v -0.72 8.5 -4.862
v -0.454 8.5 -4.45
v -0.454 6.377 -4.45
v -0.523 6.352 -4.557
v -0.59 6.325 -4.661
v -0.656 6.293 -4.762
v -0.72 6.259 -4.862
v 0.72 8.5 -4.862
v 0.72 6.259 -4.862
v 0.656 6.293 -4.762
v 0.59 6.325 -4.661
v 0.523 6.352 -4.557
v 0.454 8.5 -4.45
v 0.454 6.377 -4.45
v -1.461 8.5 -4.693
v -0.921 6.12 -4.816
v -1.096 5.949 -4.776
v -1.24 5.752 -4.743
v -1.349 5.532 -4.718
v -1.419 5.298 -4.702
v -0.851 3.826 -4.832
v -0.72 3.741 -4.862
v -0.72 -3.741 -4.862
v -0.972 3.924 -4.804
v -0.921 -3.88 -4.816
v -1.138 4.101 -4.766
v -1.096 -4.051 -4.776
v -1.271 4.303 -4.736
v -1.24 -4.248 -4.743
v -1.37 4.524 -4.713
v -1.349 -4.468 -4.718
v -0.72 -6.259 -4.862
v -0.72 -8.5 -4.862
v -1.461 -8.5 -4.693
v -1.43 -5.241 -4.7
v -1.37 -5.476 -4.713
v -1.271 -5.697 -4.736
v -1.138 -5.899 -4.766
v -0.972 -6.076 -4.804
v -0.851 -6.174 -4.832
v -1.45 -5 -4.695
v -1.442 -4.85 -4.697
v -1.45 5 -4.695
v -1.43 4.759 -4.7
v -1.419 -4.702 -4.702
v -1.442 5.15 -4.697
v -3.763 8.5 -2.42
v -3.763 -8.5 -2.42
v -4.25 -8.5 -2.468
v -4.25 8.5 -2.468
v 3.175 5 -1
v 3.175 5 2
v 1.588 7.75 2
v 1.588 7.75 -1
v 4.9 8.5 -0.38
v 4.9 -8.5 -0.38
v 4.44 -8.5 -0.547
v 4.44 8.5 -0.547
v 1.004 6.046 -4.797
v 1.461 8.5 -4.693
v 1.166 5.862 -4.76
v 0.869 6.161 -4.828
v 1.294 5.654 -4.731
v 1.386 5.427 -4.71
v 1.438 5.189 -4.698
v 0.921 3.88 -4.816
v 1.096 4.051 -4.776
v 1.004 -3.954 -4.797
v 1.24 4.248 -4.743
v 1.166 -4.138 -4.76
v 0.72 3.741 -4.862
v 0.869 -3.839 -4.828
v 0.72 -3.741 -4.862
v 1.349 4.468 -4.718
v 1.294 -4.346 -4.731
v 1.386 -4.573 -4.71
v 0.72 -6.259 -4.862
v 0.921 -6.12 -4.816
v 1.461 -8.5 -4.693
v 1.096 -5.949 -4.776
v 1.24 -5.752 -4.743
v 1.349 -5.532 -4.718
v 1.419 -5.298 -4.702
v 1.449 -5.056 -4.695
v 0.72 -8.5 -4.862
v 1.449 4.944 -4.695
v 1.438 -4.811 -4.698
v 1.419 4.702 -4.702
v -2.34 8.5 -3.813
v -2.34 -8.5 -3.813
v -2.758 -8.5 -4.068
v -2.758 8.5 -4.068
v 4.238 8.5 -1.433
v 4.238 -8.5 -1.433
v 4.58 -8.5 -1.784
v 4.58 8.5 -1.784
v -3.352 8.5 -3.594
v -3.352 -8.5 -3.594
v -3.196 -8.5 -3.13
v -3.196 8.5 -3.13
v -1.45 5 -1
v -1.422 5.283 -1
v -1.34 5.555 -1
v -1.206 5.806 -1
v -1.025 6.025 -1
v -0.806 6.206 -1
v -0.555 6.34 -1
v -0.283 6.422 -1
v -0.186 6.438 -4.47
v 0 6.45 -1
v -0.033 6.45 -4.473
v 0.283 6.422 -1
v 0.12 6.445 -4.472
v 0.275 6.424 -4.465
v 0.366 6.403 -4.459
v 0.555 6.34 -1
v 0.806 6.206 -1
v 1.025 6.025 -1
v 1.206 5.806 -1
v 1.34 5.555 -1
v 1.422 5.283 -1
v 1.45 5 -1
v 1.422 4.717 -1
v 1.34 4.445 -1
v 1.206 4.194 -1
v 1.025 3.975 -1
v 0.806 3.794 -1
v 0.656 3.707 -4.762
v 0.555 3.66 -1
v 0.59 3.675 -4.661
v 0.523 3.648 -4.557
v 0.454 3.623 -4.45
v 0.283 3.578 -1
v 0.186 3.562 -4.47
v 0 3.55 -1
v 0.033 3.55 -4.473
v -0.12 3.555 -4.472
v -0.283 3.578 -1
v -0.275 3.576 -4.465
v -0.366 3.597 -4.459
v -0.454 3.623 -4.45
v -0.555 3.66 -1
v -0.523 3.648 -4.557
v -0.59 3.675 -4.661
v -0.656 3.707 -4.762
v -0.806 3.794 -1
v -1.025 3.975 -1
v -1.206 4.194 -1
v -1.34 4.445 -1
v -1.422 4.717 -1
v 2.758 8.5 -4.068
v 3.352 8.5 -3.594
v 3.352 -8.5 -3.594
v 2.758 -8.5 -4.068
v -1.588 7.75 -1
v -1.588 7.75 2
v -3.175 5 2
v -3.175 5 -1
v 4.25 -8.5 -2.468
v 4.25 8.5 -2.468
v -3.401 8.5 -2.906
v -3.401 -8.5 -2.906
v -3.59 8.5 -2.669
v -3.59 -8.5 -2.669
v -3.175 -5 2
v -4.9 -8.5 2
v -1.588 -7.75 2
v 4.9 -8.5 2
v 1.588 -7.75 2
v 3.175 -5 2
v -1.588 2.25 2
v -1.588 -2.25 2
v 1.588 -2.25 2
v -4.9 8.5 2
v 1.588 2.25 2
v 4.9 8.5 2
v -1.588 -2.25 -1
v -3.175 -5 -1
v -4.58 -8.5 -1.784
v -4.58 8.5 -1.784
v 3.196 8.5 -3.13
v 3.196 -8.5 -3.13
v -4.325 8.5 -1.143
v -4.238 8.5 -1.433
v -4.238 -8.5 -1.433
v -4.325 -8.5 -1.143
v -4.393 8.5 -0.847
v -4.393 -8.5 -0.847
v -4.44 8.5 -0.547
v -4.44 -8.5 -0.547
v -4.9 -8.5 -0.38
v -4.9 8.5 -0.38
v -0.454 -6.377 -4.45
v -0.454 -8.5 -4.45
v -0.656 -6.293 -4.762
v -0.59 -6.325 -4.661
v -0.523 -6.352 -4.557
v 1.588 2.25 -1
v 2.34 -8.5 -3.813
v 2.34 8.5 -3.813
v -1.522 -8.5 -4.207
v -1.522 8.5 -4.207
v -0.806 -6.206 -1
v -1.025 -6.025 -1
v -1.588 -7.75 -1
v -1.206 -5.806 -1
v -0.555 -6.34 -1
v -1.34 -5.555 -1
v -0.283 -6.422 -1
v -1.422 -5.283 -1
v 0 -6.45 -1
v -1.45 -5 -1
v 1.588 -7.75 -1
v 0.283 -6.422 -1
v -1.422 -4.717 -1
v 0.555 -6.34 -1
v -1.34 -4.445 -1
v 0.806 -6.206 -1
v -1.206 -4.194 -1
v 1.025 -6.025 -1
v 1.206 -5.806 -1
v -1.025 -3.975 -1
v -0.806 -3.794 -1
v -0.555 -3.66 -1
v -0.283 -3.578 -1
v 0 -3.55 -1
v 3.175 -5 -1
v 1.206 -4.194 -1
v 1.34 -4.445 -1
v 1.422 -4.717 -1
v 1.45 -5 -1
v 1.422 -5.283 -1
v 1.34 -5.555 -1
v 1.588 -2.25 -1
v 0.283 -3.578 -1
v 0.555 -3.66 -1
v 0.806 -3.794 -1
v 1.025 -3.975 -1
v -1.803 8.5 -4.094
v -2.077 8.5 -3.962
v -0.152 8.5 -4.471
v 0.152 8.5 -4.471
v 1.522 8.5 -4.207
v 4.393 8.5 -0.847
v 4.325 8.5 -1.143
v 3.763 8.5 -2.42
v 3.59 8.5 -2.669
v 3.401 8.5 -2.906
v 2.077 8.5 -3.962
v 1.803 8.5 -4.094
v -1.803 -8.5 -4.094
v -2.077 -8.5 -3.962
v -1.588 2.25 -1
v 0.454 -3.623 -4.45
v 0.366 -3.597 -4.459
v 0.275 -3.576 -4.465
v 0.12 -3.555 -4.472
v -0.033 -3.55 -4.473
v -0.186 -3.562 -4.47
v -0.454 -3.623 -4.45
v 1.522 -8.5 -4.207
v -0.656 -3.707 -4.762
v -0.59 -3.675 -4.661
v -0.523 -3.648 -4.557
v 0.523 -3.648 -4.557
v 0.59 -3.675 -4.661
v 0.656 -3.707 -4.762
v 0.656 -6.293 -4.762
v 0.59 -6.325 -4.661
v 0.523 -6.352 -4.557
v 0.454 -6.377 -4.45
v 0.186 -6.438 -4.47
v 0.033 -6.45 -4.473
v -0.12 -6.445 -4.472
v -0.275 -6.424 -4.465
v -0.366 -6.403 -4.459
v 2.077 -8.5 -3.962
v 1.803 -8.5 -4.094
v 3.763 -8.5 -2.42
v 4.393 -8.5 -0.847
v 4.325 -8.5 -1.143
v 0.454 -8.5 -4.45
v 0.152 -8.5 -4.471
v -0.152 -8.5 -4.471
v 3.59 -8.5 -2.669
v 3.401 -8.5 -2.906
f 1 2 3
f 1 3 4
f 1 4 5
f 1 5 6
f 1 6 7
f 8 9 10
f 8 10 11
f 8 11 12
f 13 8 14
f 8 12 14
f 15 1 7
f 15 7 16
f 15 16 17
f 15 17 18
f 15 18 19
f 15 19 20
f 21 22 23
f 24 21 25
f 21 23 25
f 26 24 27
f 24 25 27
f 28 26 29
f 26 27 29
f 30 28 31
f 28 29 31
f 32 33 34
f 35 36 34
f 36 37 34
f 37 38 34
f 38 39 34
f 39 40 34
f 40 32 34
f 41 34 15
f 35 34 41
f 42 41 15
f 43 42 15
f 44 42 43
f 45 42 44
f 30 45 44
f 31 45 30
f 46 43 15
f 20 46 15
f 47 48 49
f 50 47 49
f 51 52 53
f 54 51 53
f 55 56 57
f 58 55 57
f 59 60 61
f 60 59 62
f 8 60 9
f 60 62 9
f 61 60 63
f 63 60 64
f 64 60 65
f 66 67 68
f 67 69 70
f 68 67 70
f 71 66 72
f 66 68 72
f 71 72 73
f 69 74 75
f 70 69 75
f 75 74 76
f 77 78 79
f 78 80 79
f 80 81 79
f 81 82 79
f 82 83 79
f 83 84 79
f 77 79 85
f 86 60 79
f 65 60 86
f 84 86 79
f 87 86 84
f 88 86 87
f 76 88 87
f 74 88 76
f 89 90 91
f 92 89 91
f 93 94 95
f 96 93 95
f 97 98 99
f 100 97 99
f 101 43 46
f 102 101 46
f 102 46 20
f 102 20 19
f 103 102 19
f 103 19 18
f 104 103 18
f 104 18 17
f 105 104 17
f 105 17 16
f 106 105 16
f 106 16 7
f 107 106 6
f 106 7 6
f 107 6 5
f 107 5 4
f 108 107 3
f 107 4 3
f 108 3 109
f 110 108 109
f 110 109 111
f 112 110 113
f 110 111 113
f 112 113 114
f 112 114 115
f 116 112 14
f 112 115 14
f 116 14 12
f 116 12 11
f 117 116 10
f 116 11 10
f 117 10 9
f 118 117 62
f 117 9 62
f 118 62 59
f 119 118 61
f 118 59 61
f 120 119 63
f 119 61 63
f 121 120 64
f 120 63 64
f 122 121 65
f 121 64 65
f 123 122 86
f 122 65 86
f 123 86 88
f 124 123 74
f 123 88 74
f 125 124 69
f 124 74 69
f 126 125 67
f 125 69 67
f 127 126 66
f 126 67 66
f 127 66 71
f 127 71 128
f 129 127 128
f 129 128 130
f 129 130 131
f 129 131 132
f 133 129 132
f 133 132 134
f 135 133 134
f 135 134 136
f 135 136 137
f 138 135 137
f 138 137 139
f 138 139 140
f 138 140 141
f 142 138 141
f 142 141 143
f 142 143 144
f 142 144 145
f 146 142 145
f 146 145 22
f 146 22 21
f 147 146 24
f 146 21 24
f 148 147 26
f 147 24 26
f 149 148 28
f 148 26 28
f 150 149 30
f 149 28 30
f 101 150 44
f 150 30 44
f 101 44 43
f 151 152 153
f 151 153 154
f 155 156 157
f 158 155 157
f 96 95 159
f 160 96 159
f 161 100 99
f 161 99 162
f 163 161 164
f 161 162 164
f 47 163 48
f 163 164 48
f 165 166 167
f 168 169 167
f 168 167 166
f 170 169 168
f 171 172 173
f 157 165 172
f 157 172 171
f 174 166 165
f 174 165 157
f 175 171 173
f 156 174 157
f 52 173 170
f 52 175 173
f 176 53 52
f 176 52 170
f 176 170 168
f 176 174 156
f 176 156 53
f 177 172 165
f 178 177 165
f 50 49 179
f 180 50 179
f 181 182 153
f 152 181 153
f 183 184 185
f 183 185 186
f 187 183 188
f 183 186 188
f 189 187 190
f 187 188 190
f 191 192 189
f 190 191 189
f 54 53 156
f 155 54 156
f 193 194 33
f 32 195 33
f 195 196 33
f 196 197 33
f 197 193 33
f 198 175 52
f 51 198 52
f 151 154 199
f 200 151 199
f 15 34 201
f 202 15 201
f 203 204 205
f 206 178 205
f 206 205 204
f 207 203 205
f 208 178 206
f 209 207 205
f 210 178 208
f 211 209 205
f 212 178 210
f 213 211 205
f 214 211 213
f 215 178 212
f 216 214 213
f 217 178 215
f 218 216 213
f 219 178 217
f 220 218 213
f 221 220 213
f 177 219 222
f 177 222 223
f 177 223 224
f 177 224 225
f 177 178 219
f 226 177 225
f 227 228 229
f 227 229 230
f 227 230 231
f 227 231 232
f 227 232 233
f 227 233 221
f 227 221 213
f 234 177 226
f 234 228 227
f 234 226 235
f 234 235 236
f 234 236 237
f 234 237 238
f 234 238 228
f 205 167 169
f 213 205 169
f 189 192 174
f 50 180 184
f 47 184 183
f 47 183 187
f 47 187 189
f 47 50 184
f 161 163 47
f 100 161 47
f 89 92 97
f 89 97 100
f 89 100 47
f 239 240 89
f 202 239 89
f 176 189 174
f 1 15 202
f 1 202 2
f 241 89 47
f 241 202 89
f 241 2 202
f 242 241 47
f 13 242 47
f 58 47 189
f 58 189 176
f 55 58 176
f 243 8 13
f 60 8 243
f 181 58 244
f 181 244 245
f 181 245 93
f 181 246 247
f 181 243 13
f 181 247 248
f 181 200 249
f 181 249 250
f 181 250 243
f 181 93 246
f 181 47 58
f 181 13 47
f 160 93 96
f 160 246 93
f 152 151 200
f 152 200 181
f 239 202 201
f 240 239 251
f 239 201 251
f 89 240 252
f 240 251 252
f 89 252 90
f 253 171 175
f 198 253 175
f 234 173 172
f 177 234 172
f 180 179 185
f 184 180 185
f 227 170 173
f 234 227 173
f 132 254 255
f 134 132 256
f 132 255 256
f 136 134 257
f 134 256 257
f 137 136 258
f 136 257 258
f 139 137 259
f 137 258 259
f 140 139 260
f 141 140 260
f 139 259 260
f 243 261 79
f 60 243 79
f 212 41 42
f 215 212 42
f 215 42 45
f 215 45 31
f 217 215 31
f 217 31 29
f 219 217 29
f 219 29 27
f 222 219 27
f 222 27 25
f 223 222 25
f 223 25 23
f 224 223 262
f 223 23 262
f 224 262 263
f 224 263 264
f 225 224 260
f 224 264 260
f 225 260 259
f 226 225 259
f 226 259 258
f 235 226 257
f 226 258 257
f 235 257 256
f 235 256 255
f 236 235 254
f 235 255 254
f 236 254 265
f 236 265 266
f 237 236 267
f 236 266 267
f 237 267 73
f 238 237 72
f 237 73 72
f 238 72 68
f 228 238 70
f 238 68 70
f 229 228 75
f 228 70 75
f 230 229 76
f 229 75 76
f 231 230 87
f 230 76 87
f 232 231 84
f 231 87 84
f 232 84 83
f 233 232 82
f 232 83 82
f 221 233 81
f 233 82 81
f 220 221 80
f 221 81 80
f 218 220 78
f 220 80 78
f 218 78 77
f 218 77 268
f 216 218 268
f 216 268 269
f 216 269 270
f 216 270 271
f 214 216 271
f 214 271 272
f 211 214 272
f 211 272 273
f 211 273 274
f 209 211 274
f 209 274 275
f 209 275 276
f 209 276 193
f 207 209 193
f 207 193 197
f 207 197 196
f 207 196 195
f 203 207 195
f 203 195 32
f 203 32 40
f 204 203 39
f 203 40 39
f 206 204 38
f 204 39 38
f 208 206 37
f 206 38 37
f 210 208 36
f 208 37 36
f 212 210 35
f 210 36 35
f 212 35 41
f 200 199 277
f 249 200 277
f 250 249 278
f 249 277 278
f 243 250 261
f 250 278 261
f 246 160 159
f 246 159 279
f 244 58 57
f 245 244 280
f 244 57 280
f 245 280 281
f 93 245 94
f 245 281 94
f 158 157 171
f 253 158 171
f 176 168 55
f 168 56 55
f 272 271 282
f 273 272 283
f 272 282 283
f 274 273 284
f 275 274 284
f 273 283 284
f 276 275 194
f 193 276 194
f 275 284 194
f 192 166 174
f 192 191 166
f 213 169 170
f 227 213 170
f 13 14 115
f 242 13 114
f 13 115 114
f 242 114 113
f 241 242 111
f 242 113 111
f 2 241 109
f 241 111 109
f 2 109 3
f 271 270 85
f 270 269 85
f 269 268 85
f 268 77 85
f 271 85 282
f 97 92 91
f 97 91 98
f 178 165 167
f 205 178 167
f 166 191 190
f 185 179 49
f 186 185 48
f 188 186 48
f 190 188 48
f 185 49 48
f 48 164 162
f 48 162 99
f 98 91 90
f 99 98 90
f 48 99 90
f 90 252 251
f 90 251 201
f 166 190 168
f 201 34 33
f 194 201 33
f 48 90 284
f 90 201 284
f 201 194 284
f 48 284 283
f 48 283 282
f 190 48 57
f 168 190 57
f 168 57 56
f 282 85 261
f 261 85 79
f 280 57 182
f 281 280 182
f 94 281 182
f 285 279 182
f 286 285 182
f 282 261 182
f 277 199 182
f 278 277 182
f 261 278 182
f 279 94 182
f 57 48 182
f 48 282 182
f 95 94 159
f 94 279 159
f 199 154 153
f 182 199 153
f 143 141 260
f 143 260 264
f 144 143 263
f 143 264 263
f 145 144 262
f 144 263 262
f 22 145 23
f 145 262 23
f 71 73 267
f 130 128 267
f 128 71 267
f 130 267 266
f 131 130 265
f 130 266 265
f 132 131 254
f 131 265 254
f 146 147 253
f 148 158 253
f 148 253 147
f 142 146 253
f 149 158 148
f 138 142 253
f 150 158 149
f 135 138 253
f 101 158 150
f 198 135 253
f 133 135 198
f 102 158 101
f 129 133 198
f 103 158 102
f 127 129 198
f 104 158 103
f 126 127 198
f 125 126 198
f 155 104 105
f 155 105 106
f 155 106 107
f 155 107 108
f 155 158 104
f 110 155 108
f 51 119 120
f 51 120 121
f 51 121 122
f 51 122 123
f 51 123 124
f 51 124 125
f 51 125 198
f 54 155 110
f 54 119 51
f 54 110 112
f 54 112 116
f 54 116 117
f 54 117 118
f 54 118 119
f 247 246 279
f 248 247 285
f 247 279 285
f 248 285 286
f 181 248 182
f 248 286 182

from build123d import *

# Parameters (mm, degrees)
BOSS_EXTRUDE1_DEPTH             = 8.5
BOSS_EXTRUDE2_REACH             = 12.596
BOSS_EXTRUDE2_DIRECTION_2_REACH = 12.596
CIRPATTERN1_START               = -8.5
CIRPATTERN1_DEPTH               = 17
CUT_EXTRUDE1_DEPTH              = 19.347920123
CUT_EXTRUDE1_DEPTH_BACK         = 19.347920123
SKETCH10_W                      = 9.8
SKETCH10_H                      = 17
BOSS_EXTRUDE3_DEPTH             = 2
M2_5_CLEARANCE_HOLE1_D          = 2.9
CUT_EXTRUDE2_DEPTH              = 3


# Read off the part's stored shape, not the designer's step: CirPattern1
with BuildPart() as part:
    # Sketch1 → Boss-Extrude1 (new, symmetric)
    with BuildSketch(Plane(origin=(0, 0, 0), x_dir=(1, 0, 0), z_dir=(0, 1, 0))):
        with BuildLine():
            ThreePointArc((-4.44, 0.547426308), (-4.465207061, 0.274228857), (-4.473619962, 0))
            Line((-4.473619962, 0), (-4.44, 0))
            Line((-4.44, 0), (-4.44, 0.547426308))
        make_face()
        with BuildLine():
            Line((-4.44, 0.547426308), (-4.44, 0))
            Line((-4.44, 0), (4.473619962, 0))
            ThreePointArc((4.473619962, 0), (0.274228857, 4.465207061), (-4.44, 0.547426308))
        make_face()
    extrude(amount=BOSS_EXTRUDE1_DEPTH, both=True)

    # Boss-Extrude2: up to this face of the body (flat: up to its plane)
    boss_extrude2_end = Plane(part.part.faces().sort_by_distance((0, 8.5, -1.898663281))[0])
    # Sketch1<3> → Boss-Extrude2 (add, up to the picked face)
    with BuildSketch(Plane(origin=(0, 0, 0), x_dir=(1, 0, 0), z_dir=(0, 1, 0)), mode=Mode.PRIVATE) as boss_extrude2_sk1:
        Polygon((-4.44, 0.547426308), (-4.44, -0.547426308), (-4.9, -0.38), (-4.9, 0.38), align=None)
    boss_extrude2_tool1 = split(extrude(boss_extrude2_sk1.sketch, amount=BOSS_EXTRUDE2_REACH, mode=Mode.PRIVATE), bisect_by=boss_extrude2_end, keep=Keep.BOTH, mode=Mode.PRIVATE)
    # Sketch1<3> → Boss-Extrude2 (add, up to the picked face)
    with BuildSketch(Plane(origin=(0, 0, 0), x_dir=(1, 0, 0), z_dir=(0, 1, 0)), mode=Mode.PRIVATE) as boss_extrude2_sk2:
        with BuildLine():
            Line((-4.473619962, 0), (4.473619962, 0))
            ThreePointArc((4.473619962, 0), (0, 4.473619962), (-4.473619962, 0))
        make_face()
    boss_extrude2_tool2 = split(extrude(boss_extrude2_sk2.sketch, amount=BOSS_EXTRUDE2_REACH, mode=Mode.PRIVATE), bisect_by=boss_extrude2_end, keep=Keep.BOTH, mode=Mode.PRIVATE)
    add(boss_extrude2_tool1.solids().sort_by(Axis((-4.65616, 0, 0), (0, 1, 0)))[0])
    add(boss_extrude2_tool2.solids().sort_by(Axis((0, 0, -1.898663), (0, 1, 0)))[0])

    # Boss-Extrude2 direction 2: up to this face of the body (flat: up to its plane)
    boss_extrude2_direction_2_end = Plane(part.part.faces().sort_by_distance((0, -8.5, -1.898663281))[0])
    # Sketch1<3> → Boss-Extrude2 direction 2 (add, up to the picked face)
    with BuildSketch(Plane(origin=(0, 0, 0), x_dir=(1, 0, 0), z_dir=(0, 1, 0)), mode=Mode.PRIVATE) as boss_extrude2_direction_2_sk1:
        Polygon((-4.44, 0.547426308), (-4.44, -0.547426308), (-4.9, -0.38), (-4.9, 0.38), align=None)
    boss_extrude2_direction_2_tool1 = split(extrude(boss_extrude2_direction_2_sk1.sketch, amount=-BOSS_EXTRUDE2_DIRECTION_2_REACH, mode=Mode.PRIVATE), bisect_by=boss_extrude2_direction_2_end, keep=Keep.BOTH, mode=Mode.PRIVATE)
    # Sketch1<3> → Boss-Extrude2 direction 2 (add, up to the picked face)
    with BuildSketch(Plane(origin=(0, 0, 0), x_dir=(1, 0, 0), z_dir=(0, 1, 0)), mode=Mode.PRIVATE) as boss_extrude2_direction_2_sk2:
        with BuildLine():
            Line((-4.473619962, 0), (4.473619962, 0))
            ThreePointArc((4.473619962, 0), (0, 4.473619962), (-4.473619962, 0))
        make_face()
    boss_extrude2_direction_2_tool2 = split(extrude(boss_extrude2_direction_2_sk2.sketch, amount=-BOSS_EXTRUDE2_DIRECTION_2_REACH, mode=Mode.PRIVATE), bisect_by=boss_extrude2_direction_2_end, keep=Keep.BOTH, mode=Mode.PRIVATE)
    add(boss_extrude2_direction_2_tool1.solids().sort_by(Axis((-4.65616, 0, 0), (0, -1, 0)))[0])
    add(boss_extrude2_direction_2_tool2.solids().sort_by(Axis((0, 0, -1.898663), (0, -1, 0)))[0])

    # CirPattern1 outline → CirPattern1 (add)
    with BuildSketch(Plane(origin=(0, 0, 0), x_dir=(1, 0, 0), z_dir=(0, 1, 0)).offset(CIRPATTERN1_START)):
        with BuildLine():
            Line((4.9, 0.38), (4.44, 0.547426308))
            ThreePointArc((4.44, 0.547426308), (4.465207061, 0.274228857), (4.473619962, 0))
            ThreePointArc((4.473619962, 0), (4.465207061, -0.274228857), (4.44, -0.547426308))
            Line((4.44, -0.547426308), (4.9, -0.38))
            Line((4.9, -0.38), (4.9, 0.38))
        make_face()
        with BuildLine():
            Line((4.249871632, 2.468398491), (3.762782401, 2.419657862))
            ThreePointArc((3.762782401, 2.419657862), (4.030592313, 1.941030956), (4.237821147, 1.433229741))
            Line((4.237821147, 1.433229741), (4.579623274, 1.783662152))
            Line((4.579623274, 1.783662152), (4.249871632, 2.468398491))
        make_face()
        with BuildLine():
            Line((2.758004066, 4.067900389), (2.340299599, 3.812646502))
            ThreePointArc((2.340299599, 3.812646502), (2.789256424, 3.497616927), (3.196289842, 3.130017062))
            Line((3.196289842, 3.130017062), (3.352195992, 3.594048139))
            Line((3.352195992, 3.594048139), (2.758004066, 4.067900389))
        make_face()
        with BuildLine():
            Line((0.71987997, 4.861704725), (0.454291759, 4.450493744))
            ThreePointArc((0.454291759, 4.450493744), (0.995474092, 4.361456969), (1.521694134, 4.206866117))
            Line((1.521694134, 4.206866117), (1.460825183, 4.692588815))
            Line((1.460825183, 4.692588815), (0.71987997, 4.861704725))
        make_face()
        with BuildLine():
            Line((-1.460825183, 4.692588815), (-1.521694134, 4.206866117))
            ThreePointArc((-1.521694134, 4.206866117), (-0.995474092, 4.361456969), (-0.454291759, 4.450493744))
            Line((-0.454291759, 4.450493744), (-0.71987997, 4.861704725))
            Line((-0.71987997, 4.861704725), (-1.460825183, 4.692588815))
        make_face()
        with BuildLine():
            Line((-3.352195992, 3.594048139), (-3.196289842, 3.130017062))
            ThreePointArc((-3.196289842, 3.130017062), (-2.789256424, 3.497616927), (-2.340299599, 3.812646502))
            Line((-2.340299599, 3.812646502), (-2.758004066, 4.067900389))
            Line((-2.758004066, 4.067900389), (-3.352195992, 3.594048139))
        make_face()
        with BuildLine():
            Line((-3.7627824, 2.419657862), (-4.249871632, 2.468398491))
            Line((-4.249871632, 2.468398491), (-4.579623274, 1.783662152))
            Line((-4.579623274, 1.783662152), (-4.237821147, 1.433229741))
            ThreePointArc((-4.237821147, 1.433229741), (-4.030592312, 1.941030956), (-3.7627824, 2.419657862))
        make_face()
    extrude(amount=CIRPATTERN1_DEPTH)

    # Sketch4 → Cut-Extrude1 (cut, two sides: drawn at the far end of the back side and taken through both)
    with BuildSketch(Plane(origin=(0, 8.5, 0), x_dir=(1, 0, 0), z_dir=(0, 1, 0)).offset(-CUT_EXTRUDE1_DEPTH_BACK)):
        Polygon((-36.779321089, 0), (-4.9, 0), (4.9, 0), (36.779321089, 0), (36.779321089, -63.758642179), (-36.779321089, -63.758642179), align=None)
    extrude(amount=CUT_EXTRUDE1_DEPTH + CUT_EXTRUDE1_DEPTH_BACK, mode=Mode.SUBTRACT)

    # Sketch10 → Boss-Extrude3 (add)
    with BuildSketch(Plane.XY):
        Rectangle(SKETCH10_W, SKETCH10_H)
    extrude(amount=BOSS_EXTRUDE3_DEPTH)

    # M2.5 Clearance Hole1 (through all)
    with Locations(Plane(origin=(-2.188156234, 1.776538328, 2), x_dir=(1, 0, 0), z_dir=(0, 0, 1))):
        with Locations((2.188156234, 3.223461672), (2.188156234, -6.776538328)):
            Hole(M2_5_CLEARANCE_HOLE1_D / 2)

    # Sketch9 → Cut-Extrude2 (cut)
    with BuildSketch(Plane.XY.offset(2)):
        Polygon((-3.175426481, 5), (-1.58771324, 2.25), (1.58771324, 2.25), (3.175426481, 5), (1.58771324, 7.75), (-1.58771324, 7.75), align=None)
        Polygon((-3.175426481, -5), (-1.58771324, -7.75), (1.58771324, -7.75), (3.175426481, -5), (1.58771324, -2.25), (-1.58771324, -2.25), align=None)
    extrude(amount=-CUT_EXTRUDE2_DEPTH, mode=Mode.SUBTRACT)


solid = part.part
